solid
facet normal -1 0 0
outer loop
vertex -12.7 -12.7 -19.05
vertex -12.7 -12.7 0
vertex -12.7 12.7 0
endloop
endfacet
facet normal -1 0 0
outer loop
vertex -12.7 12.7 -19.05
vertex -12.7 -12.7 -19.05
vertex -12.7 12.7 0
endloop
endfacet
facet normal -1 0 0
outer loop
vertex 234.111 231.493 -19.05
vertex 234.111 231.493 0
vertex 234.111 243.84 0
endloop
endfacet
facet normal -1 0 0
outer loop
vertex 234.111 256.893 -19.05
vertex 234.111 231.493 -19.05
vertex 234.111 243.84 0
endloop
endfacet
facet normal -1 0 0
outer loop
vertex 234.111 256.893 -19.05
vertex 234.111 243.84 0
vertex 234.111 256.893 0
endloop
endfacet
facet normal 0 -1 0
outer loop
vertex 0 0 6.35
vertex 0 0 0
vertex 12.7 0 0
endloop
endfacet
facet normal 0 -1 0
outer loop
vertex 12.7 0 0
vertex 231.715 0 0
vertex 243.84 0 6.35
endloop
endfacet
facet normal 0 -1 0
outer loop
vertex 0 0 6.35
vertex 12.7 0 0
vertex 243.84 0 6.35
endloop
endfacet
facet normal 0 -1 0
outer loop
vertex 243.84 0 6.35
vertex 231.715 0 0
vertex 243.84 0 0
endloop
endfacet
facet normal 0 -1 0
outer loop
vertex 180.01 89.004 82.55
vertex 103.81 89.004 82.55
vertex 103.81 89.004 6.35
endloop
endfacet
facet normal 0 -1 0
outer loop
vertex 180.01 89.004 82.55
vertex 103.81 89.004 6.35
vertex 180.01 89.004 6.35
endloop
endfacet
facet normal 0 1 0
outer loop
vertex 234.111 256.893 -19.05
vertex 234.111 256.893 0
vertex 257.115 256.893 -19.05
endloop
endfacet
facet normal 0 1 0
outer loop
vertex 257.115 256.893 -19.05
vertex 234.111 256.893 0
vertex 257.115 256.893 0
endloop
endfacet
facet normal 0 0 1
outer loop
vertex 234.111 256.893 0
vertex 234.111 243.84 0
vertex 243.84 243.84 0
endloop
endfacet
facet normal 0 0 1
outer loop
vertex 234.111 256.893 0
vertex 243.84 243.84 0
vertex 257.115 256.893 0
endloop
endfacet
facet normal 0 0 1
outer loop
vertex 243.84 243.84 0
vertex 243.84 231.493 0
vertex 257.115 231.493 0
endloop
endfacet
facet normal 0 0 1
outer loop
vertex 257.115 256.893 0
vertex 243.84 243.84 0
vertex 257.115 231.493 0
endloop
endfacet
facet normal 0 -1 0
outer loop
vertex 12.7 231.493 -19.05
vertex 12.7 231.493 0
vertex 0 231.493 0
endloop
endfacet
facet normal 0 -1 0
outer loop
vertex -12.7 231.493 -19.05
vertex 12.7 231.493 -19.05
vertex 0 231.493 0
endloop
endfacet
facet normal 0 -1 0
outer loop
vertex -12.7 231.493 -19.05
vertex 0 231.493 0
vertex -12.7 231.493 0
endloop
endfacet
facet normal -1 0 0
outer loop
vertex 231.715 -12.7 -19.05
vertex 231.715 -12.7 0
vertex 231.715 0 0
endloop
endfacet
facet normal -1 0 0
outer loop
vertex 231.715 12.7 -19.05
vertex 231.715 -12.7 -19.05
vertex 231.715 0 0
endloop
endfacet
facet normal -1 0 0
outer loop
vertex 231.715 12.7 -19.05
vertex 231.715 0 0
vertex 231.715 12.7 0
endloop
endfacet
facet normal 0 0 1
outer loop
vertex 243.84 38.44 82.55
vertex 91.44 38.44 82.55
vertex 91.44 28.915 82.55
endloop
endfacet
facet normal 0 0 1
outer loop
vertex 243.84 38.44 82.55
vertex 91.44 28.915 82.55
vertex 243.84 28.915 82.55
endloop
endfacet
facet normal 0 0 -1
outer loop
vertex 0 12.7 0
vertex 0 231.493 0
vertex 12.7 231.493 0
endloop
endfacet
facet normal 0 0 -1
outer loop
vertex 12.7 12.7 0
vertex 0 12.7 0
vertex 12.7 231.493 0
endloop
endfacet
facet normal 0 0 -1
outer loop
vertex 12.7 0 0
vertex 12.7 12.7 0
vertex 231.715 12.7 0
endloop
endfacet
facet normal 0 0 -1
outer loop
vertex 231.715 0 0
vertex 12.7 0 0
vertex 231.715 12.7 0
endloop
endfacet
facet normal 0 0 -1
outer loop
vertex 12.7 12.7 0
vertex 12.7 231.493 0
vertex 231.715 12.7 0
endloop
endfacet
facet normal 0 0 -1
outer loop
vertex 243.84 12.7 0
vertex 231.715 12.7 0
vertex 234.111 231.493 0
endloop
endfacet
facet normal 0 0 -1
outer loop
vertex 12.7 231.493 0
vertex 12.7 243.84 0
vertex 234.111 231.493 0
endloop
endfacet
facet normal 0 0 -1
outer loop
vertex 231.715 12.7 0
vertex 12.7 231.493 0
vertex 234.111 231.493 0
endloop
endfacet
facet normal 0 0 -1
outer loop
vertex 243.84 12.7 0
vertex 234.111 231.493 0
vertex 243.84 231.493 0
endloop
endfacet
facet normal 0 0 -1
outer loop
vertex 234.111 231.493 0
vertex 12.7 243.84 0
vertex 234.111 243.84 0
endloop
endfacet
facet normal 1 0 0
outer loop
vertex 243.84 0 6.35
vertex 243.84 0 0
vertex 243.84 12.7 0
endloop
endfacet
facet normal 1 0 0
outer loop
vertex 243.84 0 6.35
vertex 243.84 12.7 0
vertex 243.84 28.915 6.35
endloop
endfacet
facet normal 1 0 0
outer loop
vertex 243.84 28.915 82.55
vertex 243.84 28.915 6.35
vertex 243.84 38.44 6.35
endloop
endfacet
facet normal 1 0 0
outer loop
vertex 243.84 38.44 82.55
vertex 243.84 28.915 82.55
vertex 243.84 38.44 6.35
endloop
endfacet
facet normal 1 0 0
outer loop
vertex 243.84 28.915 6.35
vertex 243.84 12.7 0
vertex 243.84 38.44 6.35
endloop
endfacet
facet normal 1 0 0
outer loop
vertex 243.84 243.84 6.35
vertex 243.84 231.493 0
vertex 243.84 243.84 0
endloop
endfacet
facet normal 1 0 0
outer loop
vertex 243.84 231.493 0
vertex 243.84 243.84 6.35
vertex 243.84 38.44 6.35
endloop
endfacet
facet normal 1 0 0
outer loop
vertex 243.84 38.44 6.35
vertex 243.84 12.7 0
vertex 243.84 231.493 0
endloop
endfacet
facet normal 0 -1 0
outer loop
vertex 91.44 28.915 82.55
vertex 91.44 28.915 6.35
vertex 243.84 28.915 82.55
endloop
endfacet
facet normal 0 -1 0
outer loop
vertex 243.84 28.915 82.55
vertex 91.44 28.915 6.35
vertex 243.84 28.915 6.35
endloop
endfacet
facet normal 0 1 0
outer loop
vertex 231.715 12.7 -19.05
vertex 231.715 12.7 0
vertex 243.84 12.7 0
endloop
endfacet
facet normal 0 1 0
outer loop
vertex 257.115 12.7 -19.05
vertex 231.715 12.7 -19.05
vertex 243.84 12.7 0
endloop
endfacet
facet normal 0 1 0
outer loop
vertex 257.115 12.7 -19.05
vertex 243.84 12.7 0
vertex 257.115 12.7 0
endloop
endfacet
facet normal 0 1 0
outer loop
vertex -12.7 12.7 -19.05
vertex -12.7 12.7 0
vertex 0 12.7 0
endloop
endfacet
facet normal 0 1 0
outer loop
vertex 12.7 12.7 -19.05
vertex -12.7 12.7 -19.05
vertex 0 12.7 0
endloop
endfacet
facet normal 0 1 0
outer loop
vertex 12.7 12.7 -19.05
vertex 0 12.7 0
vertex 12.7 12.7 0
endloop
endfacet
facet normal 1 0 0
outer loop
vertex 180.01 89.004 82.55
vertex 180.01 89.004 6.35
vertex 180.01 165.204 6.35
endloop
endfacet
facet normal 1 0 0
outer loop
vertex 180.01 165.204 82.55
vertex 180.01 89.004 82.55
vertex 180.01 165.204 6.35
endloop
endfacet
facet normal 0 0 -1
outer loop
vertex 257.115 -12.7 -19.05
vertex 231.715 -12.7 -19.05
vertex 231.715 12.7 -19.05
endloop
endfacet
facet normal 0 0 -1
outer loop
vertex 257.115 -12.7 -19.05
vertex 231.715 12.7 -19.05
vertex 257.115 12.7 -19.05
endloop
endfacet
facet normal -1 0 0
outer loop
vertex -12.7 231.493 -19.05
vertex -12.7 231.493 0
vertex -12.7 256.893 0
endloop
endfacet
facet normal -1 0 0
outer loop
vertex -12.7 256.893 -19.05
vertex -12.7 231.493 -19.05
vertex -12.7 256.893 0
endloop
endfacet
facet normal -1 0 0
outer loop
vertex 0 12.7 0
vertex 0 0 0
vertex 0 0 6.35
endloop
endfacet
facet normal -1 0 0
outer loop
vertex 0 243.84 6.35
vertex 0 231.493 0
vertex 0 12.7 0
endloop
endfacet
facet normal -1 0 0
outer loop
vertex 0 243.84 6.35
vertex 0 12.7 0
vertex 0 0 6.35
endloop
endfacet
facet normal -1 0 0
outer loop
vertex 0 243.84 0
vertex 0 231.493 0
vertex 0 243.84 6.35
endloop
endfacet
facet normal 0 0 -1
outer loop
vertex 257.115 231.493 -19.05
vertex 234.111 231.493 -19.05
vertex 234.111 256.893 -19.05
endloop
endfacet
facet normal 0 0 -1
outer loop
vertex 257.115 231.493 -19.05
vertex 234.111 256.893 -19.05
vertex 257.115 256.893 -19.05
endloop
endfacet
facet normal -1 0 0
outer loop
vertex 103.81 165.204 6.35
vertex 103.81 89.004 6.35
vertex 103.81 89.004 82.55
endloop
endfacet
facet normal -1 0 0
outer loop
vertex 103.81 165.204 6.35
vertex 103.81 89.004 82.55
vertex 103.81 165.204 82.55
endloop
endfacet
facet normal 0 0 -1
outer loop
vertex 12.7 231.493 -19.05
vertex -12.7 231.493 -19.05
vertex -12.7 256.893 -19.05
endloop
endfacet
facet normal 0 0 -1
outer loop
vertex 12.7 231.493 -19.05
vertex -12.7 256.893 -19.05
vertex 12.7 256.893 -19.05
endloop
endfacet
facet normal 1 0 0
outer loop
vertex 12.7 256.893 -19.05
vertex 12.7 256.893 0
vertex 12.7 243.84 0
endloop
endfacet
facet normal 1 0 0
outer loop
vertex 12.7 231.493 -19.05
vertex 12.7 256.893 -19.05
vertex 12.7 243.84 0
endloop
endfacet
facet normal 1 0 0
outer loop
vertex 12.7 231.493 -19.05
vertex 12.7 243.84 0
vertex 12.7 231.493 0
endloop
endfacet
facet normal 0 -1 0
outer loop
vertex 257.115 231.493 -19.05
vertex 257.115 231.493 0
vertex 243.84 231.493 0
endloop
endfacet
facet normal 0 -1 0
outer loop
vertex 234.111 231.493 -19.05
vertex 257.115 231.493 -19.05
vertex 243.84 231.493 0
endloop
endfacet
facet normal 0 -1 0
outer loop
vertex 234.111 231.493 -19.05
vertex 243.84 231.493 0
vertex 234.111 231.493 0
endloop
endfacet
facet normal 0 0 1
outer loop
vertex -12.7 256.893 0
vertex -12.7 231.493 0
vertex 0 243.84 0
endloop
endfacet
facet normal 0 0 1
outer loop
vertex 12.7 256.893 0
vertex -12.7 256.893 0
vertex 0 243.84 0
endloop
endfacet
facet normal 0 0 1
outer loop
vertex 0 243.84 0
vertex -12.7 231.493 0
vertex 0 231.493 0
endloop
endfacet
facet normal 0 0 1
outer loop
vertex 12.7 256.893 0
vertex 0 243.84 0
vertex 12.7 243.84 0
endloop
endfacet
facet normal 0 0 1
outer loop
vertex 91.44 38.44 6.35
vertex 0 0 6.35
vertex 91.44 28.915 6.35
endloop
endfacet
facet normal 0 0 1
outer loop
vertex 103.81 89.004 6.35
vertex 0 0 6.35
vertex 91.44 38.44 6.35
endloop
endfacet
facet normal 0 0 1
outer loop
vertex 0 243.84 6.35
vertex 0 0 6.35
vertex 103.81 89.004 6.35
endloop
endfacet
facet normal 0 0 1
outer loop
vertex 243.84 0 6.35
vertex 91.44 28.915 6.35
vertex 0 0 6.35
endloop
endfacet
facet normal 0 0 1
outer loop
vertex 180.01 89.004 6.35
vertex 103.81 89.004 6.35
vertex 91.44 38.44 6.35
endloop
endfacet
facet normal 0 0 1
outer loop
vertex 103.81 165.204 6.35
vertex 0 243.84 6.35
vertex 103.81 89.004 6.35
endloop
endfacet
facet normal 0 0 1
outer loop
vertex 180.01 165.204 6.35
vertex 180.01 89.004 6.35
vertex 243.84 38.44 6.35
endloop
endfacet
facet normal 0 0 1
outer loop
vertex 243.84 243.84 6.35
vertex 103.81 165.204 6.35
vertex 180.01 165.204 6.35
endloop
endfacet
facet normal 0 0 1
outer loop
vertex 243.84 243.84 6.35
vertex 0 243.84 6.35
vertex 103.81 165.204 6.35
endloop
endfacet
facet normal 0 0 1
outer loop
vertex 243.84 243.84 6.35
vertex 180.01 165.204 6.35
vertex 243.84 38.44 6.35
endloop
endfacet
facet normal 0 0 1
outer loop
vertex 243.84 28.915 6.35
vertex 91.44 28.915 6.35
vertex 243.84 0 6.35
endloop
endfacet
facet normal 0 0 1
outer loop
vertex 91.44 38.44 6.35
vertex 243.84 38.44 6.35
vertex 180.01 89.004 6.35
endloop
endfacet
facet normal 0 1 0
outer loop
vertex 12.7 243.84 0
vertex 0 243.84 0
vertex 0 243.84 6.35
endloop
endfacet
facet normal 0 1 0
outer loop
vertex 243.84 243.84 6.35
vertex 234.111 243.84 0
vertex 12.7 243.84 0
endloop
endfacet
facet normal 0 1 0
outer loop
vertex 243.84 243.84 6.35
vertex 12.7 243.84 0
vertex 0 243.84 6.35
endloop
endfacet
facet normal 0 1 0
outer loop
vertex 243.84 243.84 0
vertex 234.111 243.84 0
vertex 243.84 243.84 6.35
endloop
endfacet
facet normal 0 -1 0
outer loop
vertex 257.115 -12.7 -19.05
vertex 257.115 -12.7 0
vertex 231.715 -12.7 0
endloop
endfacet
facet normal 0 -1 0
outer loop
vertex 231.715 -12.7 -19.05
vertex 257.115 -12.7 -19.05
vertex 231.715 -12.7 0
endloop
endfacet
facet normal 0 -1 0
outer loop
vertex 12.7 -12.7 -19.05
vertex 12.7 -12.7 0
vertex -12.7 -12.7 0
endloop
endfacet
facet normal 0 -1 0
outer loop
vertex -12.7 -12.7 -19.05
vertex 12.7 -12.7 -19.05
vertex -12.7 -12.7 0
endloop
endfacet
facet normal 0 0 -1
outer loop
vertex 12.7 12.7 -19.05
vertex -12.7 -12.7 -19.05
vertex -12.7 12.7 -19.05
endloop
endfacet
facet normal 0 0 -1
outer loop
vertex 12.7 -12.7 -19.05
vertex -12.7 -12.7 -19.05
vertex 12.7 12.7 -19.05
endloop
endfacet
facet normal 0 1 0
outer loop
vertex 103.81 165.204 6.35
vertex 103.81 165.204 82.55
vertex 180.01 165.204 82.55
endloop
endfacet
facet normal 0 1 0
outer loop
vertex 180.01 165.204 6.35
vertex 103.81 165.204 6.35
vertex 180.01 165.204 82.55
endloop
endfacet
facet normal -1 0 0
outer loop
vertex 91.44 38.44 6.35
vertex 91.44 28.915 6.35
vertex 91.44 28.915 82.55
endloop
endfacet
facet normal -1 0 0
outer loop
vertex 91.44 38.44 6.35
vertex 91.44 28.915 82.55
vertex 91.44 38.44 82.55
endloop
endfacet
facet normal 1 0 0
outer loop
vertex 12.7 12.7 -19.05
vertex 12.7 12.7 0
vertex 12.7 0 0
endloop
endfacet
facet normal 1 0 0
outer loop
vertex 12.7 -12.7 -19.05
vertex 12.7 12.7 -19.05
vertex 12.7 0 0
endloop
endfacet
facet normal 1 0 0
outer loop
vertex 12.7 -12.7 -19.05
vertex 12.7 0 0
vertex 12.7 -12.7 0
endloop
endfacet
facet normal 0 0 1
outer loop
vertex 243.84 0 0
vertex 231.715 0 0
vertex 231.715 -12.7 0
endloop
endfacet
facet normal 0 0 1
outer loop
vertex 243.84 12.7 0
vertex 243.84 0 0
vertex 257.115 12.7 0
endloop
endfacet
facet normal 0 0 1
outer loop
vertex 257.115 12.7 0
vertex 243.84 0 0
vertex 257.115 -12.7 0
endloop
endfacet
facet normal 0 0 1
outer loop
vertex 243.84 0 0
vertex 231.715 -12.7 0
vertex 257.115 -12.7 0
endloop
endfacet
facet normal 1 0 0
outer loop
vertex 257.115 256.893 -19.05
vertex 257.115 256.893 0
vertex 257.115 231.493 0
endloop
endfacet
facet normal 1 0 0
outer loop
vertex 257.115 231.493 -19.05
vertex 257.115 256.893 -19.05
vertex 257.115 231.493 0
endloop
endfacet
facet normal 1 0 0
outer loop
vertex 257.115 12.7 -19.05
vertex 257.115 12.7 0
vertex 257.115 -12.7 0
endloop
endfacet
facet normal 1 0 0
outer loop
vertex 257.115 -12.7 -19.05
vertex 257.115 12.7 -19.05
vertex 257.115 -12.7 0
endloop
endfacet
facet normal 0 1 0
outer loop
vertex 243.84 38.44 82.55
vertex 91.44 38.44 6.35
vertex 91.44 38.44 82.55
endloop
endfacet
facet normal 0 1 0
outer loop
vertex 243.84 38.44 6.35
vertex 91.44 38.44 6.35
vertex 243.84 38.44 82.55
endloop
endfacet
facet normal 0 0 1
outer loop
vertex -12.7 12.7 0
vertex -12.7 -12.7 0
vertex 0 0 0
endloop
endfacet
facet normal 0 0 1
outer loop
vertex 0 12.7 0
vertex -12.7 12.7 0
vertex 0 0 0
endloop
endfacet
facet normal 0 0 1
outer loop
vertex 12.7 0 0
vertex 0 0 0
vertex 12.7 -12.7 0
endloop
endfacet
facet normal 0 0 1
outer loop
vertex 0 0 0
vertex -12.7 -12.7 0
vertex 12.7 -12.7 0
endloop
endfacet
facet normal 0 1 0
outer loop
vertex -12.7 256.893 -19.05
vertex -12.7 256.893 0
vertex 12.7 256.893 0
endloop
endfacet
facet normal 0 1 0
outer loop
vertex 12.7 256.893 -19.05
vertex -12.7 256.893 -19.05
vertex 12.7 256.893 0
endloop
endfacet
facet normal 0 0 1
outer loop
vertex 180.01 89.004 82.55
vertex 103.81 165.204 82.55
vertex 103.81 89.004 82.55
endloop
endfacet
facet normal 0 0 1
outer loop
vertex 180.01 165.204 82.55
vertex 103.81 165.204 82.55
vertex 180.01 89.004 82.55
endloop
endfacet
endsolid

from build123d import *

# Parameters (mm, degrees)
F0_W     = 243.84
F0_H     = 243.84
F1_DEPTH = 6.35
F2_W     = 76.2
F2_H     = 76.2
F3_DEPTH = 76.2
F4_W     = 12.7000009538
F4_H     = 12.7
F4_W_2   = 12.1249086118
F4_H_2   = 12.346994652
F4_W_3   = 9.7286785974
F5_DEPTH = 19.05
F6_W     = 152.4
F6_H     = 9.525
F7_DEPTH = 76.2


with BuildPart() as f1:
    # F0 (on Top) → F1 (new body)
    with BuildSketch(Plane.XY):
        with Locations((121.92, 121.92)):
            Rectangle(F0_W, F0_H)
    extrude(amount=F1_DEPTH)

    # F2 (on face) → F3 (join)
    with BuildSketch(Plane.XY.offset(6.35)):
        with Locations((141.9095646479, 127.1040961146)):
            Rectangle(F2_W, F2_H)
    extrude(amount=F3_DEPTH)

    # F4 (on face) → F5 (join)
    with BuildSketch(Plane(origin=(0, 0, 0), x_dir=(1, 0, 0), z_dir=(0, 0, -1))):
        Polygon((12.7000009538, 12.7), (-12.7, 12.7), (-12.7, -12.7), (0, -12.7), (0, 0), (12.7000009538, 0), align=None)
        with Locations((6.3500004769, -6.35)):
            Rectangle(F4_W, F4_H)
        Polygon((231.7150913882, 12.7), (231.7150913882, 0), (243.84, 0), (243.84, -12.7), (257.115092342, -12.7), (257.115092342, 12.7), align=None)
        with Locations((237.7775456941, -6.35)):
            Rectangle(F4_W_2, F4_H)
        with Locations((6.3500004769, -237.666502674)):
            Rectangle(F4_W, F4_H_2)
        Polygon((0, -243.84), (0, -231.493005348), (-12.7, -231.493005348), (-12.7, -256.893005348), (12.7000009538, -256.893005348), (12.7000009538, -243.84), align=None)
        Polygon((257.115092342, -231.493005348), (243.84, -231.493005348), (243.84, -243.84), (234.1113214026, -243.84), (234.1113214026, -256.893005348), (257.115092342, -256.893005348), align=None)
        with Locations((238.9756607013, -237.666502674)):
            Rectangle(F4_W_3, F4_H_2)
    extrude(amount=F5_DEPTH)

    # F6 (on face) → F7 (join)
    with BuildSketch(Plane.XY.offset(6.35)):
        with Locations((167.64, 33.6779164493)):
            Rectangle(F6_W, F6_H)
    extrude(amount=F7_DEPTH)


solid = f1.part
